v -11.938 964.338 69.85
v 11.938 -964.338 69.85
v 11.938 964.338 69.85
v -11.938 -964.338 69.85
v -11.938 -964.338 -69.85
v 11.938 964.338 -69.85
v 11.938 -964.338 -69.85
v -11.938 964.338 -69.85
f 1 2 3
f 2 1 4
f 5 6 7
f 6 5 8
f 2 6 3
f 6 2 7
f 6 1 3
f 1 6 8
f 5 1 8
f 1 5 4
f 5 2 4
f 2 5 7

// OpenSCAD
function foot(x=1) = 304.8*x;
function inch(x=1) = 25.4*x;
function nominal(inch) = 
  (inch==1) ? 19 : 
  (inch==2) ? 38 : 
  (inch==4) ? 90 : 
  (inch==6) ? 140 : 
  0;

function deckThick() = inch(0.94); 
metThick = 1;

module lumber6feet2x4()
{
  color("burlywood")cube([foot(6),38,90],center=true);
  echo("2x4 6 feet");
}

module lumber8feet2x4()
{
  color("tan")cube([foot(8),38,90],center=true);
  echo("2x4 8 feet");
}

module joistHanger2x4()
{
  color("steelblue")
  translate([0,-inch(3.13)/2,-nominal(4)/2+inch(1)])
  {
    translate([(nominal(2)/2),0,0])cube([metThick,inch(3.13),inch(2)],center=true);
    translate([-(nominal(2)/2),0,0])cube([metThick,inch(3.13),inch(2)],center=true);
    translate([0,0,-inch(1)])cube([nominal(2),inch(3.13),metThick],center=true);
    translate([(nominal(2)-metThick+(inch(3.56)-nominal(2))/2)/2,(inch(3.13)-metThick)/2,0])cube([(inch(3.56)-nominal(2))/2,metThick,inch(2)],center=true);
    translate([-(nominal(2)-metThick+(inch(3.56)-nominal(2))/2)/2,(inch(3.13)-metThick)/2,0])cube([(inch(3.56)-nominal(2))/2,metThick,inch(2)],center=true);
  }
  echo("joisthanger 2x4");
}

module framingAngle()
{
  height=inch(2.5);
  width=inch(1.4375);
  color("steelblue")
  {
    translate([0,width/2,0])cube([metThick,width,height],center=true);
    rotate([0,0,-90])translate([0,width/2,0])cube([metThick,width,height],center=true);
  }
  echo("Framing angle");
}

module deckBoard()
{
  color("LightGray")
  {
    cube([foot(8),inch(5.5),deckThick()],center=true);
  }
  echo("deckBoard");
}

module faciaFront()
{
  color("LightGray")
  {
    cube([foot(8),deckThick(),inch(5.5)],center=true);
  }
  echo("faciaFront");
}

module faciaSide()
{
  color("LightGray")
  rotate([0,0,90])
  {
    cube([foot(6)+2*nominal(2)+deckThick(),deckThick(),inch(5.5)],center=true);
  }
  echo("faciaSide");
}


faciaSide();
